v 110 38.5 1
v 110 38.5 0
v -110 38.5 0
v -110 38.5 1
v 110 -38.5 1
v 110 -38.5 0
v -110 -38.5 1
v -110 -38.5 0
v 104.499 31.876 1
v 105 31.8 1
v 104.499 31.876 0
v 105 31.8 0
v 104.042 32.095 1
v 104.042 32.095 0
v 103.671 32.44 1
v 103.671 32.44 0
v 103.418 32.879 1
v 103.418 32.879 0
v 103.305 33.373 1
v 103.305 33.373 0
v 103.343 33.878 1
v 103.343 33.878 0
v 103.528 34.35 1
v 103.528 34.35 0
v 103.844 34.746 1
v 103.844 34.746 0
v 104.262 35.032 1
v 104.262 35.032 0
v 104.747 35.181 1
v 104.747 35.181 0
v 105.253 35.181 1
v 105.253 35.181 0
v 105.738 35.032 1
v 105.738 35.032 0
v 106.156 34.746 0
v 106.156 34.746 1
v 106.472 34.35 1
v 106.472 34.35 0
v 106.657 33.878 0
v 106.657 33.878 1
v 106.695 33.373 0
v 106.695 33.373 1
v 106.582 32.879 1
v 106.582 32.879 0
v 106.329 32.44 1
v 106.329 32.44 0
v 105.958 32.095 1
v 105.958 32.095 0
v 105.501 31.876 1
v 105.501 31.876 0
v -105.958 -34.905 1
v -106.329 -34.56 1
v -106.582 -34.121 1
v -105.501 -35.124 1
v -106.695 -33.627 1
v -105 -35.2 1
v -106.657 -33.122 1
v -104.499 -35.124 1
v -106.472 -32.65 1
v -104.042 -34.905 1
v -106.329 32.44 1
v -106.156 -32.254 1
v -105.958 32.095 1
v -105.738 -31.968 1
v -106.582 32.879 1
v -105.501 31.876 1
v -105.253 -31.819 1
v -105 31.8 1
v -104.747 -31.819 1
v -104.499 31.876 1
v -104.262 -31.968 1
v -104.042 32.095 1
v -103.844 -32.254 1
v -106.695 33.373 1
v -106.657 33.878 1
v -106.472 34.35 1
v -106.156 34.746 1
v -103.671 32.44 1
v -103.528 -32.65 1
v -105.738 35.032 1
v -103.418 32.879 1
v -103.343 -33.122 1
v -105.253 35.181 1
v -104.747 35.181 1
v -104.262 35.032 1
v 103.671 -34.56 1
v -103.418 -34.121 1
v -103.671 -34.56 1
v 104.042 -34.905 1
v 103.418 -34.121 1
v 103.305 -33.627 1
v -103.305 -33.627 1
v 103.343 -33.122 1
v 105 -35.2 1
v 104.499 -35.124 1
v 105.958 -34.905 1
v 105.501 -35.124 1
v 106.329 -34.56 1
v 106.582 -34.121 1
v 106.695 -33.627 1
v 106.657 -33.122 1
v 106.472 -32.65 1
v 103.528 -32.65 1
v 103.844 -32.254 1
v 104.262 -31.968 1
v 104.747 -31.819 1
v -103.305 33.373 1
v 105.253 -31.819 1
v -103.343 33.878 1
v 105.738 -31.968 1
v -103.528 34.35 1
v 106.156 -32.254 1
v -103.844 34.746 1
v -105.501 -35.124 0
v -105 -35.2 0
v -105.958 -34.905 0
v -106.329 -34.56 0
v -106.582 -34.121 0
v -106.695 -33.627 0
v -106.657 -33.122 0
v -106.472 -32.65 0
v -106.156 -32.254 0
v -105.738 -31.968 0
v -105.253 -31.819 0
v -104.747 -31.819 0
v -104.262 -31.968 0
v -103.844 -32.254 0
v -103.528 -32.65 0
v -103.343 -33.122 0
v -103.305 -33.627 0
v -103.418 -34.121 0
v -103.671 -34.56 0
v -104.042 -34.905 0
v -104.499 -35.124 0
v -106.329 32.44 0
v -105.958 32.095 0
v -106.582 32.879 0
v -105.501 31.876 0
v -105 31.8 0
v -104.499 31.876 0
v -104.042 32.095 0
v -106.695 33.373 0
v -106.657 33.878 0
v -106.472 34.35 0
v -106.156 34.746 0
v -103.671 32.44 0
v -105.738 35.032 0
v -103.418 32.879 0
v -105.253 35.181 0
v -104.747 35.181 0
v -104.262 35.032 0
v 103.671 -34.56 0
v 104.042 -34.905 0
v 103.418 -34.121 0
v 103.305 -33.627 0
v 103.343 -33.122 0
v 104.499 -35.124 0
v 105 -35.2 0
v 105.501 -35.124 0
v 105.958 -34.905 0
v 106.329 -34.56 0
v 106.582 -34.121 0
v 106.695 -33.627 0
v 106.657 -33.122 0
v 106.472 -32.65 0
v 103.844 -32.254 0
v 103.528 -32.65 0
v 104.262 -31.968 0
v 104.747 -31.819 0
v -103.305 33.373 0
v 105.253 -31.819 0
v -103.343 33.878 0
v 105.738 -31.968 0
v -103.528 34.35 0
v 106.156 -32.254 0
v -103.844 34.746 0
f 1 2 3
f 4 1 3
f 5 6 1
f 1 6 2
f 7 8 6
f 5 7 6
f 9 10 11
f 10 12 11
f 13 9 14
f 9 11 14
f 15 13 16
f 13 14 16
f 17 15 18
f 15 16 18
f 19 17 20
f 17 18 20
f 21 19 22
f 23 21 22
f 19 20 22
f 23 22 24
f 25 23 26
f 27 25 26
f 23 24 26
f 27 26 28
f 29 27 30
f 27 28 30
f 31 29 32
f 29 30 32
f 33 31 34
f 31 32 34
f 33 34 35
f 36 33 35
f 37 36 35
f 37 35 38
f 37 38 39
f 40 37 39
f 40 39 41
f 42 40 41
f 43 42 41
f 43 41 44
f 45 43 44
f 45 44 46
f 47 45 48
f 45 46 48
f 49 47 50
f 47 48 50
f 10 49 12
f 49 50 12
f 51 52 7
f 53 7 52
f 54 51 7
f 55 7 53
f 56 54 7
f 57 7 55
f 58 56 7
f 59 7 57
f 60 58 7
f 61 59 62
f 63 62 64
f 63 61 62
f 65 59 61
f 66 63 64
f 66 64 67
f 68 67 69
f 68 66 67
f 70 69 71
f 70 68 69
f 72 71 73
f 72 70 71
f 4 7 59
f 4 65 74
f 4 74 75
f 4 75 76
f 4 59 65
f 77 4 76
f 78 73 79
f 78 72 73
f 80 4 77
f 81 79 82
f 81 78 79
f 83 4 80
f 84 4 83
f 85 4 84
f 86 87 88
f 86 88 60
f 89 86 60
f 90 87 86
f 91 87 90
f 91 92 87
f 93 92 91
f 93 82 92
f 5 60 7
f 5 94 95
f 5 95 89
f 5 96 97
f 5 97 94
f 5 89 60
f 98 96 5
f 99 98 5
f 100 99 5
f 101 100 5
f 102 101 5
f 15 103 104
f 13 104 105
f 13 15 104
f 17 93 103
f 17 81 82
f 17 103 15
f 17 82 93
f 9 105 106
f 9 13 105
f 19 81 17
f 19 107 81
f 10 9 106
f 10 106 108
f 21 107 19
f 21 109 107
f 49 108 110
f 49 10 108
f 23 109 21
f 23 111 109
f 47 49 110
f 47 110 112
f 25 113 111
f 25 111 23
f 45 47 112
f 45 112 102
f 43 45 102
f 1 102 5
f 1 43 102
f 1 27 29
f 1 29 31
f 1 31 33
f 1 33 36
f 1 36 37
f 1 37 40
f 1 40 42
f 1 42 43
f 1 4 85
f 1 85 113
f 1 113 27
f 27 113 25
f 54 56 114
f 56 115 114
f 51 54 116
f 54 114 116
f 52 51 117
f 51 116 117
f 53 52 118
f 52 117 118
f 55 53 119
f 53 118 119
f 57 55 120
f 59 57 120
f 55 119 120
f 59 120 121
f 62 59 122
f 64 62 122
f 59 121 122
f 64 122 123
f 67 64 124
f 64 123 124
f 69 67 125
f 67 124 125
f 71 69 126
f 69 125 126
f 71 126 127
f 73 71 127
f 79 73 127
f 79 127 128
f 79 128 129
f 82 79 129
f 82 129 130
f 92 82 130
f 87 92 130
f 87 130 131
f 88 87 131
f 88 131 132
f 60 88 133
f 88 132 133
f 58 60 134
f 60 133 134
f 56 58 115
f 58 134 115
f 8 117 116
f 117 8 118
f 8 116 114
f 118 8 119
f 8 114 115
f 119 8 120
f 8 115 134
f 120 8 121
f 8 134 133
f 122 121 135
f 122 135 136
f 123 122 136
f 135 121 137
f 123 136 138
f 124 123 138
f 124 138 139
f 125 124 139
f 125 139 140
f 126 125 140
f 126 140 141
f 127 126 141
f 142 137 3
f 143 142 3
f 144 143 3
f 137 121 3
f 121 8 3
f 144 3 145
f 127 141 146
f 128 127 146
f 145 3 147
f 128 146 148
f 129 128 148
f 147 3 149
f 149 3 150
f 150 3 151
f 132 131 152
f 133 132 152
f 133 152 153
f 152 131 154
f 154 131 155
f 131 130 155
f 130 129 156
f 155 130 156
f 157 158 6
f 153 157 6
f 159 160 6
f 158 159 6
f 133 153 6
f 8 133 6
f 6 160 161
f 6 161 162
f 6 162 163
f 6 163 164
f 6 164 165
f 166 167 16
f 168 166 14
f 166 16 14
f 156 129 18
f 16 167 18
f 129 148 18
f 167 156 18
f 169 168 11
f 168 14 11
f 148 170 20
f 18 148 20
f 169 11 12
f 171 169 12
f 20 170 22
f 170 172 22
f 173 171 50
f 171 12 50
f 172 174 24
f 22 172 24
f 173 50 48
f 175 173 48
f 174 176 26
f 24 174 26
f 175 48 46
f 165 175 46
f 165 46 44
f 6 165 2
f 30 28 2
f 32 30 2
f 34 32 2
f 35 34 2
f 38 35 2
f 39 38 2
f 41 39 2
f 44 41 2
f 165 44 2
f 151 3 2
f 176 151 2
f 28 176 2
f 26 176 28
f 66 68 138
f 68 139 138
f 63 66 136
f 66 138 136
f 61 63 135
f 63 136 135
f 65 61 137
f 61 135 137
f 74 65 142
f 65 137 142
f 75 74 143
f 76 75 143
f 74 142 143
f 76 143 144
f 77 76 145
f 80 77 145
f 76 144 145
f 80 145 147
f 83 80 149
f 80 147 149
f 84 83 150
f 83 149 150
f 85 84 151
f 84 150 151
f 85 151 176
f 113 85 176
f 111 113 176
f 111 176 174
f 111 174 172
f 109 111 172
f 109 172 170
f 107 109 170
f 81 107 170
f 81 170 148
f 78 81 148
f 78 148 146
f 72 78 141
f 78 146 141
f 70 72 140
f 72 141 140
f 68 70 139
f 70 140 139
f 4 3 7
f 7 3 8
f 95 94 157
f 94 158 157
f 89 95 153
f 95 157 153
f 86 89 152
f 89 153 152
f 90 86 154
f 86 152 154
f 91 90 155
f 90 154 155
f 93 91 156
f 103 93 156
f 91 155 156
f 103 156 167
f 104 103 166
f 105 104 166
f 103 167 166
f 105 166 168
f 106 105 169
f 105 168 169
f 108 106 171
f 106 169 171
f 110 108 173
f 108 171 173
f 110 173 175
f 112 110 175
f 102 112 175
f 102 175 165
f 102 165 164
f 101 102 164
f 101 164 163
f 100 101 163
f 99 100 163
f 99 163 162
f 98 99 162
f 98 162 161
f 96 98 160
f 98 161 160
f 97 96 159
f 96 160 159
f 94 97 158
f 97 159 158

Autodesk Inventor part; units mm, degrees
ref_plane "YZ Plane" through (0, 0, 0) normal (1, 0, 0) x (0, 1, 0)
ref_plane "XZ Plane" through (0, 0, 0) normal (0, 1, 0) x (-1, 0, 0)
ref_plane "XY Plane" through (0, 0, 0) normal (0, 0, 1) x (1, 0, 0)
sketch "スケッチ1" plane through (0, 0, 0) normal (0, 0, 1) x (1, 0, 0)
  line L0 (-110, -38.5) -> (110, -38.5)
  line L1 (110, -38.5) -> (110, 38.5)
  line L2 (110, 38.5) -> (-110, 38.5)
  line L3 (-110, 38.5) -> (-110, -38.5)
  line L4 (-110, -38.5) -> (110, 38.5) construction
  line L5 (110, -38.5) -> (-110, 38.5) construction
  point P0 (0, 0)
  dimension "d0" = 220
  dimension "d1" = 77
extrude "プレート1" add sketch "スケッチ1" along normal blind 1
sketch "スケッチ2" plane through (0, 0, 1) normal (0, 0, 1) x (1, 0, 0)
  line L0 (-110, -38.5) -> (-110, 38.5) projected
  line L1 (110, -38.5) -> (-110, -38.5) projected
  line L2 (110, 38.5) -> (110, -38.5) projected
  line L3 (-110, 38.5) -> (110, 38.5) projected
  line L4 (105, 33.5) -> (105, -33.5)
  line L5 (105, -33.5) -> (-105, -33.5)
  line L6 (-105, -33.5) -> (-105, 33.5)
  line L7 (-105, 33.5) -> (105, 33.5)
  point P0 (0, 0)
  dimension "d3" = 5
hole "穴1" at (-105, 33.5, 1) at (-105, -33.5, 1) at (105, -33.5, 1) at (105, 33.5, 1) direction (0, 0, -1) diameter 3.4 depth 1 clearance for "Flat Head Machine Screw" size "M3" standard "Ansi Metric M Profile"
equation "\"d9\" = Thickness"
equation "\"d2\" = Thickness"
equation "\"BendRadius\" = Thickness"
equation "\"BendReliefWidth\" = Thickness"
equation "\"BendReliefDepth\" = 0.5 * Thickness"
equation "\"CornerReliefSize\" = 4 * Thickness"
equation "\"MinimumRemnant\" = 2 * Thickness"
equation "\"TransitionRadius\" = BendRadius"
equation "\"JacobiRadiusSize\" = Thickness"
equation "\"GapSize\" = Thickness"
equation "\"Thickness\" = 1"
properties part number "carbon_plate14" material "CFRP"
